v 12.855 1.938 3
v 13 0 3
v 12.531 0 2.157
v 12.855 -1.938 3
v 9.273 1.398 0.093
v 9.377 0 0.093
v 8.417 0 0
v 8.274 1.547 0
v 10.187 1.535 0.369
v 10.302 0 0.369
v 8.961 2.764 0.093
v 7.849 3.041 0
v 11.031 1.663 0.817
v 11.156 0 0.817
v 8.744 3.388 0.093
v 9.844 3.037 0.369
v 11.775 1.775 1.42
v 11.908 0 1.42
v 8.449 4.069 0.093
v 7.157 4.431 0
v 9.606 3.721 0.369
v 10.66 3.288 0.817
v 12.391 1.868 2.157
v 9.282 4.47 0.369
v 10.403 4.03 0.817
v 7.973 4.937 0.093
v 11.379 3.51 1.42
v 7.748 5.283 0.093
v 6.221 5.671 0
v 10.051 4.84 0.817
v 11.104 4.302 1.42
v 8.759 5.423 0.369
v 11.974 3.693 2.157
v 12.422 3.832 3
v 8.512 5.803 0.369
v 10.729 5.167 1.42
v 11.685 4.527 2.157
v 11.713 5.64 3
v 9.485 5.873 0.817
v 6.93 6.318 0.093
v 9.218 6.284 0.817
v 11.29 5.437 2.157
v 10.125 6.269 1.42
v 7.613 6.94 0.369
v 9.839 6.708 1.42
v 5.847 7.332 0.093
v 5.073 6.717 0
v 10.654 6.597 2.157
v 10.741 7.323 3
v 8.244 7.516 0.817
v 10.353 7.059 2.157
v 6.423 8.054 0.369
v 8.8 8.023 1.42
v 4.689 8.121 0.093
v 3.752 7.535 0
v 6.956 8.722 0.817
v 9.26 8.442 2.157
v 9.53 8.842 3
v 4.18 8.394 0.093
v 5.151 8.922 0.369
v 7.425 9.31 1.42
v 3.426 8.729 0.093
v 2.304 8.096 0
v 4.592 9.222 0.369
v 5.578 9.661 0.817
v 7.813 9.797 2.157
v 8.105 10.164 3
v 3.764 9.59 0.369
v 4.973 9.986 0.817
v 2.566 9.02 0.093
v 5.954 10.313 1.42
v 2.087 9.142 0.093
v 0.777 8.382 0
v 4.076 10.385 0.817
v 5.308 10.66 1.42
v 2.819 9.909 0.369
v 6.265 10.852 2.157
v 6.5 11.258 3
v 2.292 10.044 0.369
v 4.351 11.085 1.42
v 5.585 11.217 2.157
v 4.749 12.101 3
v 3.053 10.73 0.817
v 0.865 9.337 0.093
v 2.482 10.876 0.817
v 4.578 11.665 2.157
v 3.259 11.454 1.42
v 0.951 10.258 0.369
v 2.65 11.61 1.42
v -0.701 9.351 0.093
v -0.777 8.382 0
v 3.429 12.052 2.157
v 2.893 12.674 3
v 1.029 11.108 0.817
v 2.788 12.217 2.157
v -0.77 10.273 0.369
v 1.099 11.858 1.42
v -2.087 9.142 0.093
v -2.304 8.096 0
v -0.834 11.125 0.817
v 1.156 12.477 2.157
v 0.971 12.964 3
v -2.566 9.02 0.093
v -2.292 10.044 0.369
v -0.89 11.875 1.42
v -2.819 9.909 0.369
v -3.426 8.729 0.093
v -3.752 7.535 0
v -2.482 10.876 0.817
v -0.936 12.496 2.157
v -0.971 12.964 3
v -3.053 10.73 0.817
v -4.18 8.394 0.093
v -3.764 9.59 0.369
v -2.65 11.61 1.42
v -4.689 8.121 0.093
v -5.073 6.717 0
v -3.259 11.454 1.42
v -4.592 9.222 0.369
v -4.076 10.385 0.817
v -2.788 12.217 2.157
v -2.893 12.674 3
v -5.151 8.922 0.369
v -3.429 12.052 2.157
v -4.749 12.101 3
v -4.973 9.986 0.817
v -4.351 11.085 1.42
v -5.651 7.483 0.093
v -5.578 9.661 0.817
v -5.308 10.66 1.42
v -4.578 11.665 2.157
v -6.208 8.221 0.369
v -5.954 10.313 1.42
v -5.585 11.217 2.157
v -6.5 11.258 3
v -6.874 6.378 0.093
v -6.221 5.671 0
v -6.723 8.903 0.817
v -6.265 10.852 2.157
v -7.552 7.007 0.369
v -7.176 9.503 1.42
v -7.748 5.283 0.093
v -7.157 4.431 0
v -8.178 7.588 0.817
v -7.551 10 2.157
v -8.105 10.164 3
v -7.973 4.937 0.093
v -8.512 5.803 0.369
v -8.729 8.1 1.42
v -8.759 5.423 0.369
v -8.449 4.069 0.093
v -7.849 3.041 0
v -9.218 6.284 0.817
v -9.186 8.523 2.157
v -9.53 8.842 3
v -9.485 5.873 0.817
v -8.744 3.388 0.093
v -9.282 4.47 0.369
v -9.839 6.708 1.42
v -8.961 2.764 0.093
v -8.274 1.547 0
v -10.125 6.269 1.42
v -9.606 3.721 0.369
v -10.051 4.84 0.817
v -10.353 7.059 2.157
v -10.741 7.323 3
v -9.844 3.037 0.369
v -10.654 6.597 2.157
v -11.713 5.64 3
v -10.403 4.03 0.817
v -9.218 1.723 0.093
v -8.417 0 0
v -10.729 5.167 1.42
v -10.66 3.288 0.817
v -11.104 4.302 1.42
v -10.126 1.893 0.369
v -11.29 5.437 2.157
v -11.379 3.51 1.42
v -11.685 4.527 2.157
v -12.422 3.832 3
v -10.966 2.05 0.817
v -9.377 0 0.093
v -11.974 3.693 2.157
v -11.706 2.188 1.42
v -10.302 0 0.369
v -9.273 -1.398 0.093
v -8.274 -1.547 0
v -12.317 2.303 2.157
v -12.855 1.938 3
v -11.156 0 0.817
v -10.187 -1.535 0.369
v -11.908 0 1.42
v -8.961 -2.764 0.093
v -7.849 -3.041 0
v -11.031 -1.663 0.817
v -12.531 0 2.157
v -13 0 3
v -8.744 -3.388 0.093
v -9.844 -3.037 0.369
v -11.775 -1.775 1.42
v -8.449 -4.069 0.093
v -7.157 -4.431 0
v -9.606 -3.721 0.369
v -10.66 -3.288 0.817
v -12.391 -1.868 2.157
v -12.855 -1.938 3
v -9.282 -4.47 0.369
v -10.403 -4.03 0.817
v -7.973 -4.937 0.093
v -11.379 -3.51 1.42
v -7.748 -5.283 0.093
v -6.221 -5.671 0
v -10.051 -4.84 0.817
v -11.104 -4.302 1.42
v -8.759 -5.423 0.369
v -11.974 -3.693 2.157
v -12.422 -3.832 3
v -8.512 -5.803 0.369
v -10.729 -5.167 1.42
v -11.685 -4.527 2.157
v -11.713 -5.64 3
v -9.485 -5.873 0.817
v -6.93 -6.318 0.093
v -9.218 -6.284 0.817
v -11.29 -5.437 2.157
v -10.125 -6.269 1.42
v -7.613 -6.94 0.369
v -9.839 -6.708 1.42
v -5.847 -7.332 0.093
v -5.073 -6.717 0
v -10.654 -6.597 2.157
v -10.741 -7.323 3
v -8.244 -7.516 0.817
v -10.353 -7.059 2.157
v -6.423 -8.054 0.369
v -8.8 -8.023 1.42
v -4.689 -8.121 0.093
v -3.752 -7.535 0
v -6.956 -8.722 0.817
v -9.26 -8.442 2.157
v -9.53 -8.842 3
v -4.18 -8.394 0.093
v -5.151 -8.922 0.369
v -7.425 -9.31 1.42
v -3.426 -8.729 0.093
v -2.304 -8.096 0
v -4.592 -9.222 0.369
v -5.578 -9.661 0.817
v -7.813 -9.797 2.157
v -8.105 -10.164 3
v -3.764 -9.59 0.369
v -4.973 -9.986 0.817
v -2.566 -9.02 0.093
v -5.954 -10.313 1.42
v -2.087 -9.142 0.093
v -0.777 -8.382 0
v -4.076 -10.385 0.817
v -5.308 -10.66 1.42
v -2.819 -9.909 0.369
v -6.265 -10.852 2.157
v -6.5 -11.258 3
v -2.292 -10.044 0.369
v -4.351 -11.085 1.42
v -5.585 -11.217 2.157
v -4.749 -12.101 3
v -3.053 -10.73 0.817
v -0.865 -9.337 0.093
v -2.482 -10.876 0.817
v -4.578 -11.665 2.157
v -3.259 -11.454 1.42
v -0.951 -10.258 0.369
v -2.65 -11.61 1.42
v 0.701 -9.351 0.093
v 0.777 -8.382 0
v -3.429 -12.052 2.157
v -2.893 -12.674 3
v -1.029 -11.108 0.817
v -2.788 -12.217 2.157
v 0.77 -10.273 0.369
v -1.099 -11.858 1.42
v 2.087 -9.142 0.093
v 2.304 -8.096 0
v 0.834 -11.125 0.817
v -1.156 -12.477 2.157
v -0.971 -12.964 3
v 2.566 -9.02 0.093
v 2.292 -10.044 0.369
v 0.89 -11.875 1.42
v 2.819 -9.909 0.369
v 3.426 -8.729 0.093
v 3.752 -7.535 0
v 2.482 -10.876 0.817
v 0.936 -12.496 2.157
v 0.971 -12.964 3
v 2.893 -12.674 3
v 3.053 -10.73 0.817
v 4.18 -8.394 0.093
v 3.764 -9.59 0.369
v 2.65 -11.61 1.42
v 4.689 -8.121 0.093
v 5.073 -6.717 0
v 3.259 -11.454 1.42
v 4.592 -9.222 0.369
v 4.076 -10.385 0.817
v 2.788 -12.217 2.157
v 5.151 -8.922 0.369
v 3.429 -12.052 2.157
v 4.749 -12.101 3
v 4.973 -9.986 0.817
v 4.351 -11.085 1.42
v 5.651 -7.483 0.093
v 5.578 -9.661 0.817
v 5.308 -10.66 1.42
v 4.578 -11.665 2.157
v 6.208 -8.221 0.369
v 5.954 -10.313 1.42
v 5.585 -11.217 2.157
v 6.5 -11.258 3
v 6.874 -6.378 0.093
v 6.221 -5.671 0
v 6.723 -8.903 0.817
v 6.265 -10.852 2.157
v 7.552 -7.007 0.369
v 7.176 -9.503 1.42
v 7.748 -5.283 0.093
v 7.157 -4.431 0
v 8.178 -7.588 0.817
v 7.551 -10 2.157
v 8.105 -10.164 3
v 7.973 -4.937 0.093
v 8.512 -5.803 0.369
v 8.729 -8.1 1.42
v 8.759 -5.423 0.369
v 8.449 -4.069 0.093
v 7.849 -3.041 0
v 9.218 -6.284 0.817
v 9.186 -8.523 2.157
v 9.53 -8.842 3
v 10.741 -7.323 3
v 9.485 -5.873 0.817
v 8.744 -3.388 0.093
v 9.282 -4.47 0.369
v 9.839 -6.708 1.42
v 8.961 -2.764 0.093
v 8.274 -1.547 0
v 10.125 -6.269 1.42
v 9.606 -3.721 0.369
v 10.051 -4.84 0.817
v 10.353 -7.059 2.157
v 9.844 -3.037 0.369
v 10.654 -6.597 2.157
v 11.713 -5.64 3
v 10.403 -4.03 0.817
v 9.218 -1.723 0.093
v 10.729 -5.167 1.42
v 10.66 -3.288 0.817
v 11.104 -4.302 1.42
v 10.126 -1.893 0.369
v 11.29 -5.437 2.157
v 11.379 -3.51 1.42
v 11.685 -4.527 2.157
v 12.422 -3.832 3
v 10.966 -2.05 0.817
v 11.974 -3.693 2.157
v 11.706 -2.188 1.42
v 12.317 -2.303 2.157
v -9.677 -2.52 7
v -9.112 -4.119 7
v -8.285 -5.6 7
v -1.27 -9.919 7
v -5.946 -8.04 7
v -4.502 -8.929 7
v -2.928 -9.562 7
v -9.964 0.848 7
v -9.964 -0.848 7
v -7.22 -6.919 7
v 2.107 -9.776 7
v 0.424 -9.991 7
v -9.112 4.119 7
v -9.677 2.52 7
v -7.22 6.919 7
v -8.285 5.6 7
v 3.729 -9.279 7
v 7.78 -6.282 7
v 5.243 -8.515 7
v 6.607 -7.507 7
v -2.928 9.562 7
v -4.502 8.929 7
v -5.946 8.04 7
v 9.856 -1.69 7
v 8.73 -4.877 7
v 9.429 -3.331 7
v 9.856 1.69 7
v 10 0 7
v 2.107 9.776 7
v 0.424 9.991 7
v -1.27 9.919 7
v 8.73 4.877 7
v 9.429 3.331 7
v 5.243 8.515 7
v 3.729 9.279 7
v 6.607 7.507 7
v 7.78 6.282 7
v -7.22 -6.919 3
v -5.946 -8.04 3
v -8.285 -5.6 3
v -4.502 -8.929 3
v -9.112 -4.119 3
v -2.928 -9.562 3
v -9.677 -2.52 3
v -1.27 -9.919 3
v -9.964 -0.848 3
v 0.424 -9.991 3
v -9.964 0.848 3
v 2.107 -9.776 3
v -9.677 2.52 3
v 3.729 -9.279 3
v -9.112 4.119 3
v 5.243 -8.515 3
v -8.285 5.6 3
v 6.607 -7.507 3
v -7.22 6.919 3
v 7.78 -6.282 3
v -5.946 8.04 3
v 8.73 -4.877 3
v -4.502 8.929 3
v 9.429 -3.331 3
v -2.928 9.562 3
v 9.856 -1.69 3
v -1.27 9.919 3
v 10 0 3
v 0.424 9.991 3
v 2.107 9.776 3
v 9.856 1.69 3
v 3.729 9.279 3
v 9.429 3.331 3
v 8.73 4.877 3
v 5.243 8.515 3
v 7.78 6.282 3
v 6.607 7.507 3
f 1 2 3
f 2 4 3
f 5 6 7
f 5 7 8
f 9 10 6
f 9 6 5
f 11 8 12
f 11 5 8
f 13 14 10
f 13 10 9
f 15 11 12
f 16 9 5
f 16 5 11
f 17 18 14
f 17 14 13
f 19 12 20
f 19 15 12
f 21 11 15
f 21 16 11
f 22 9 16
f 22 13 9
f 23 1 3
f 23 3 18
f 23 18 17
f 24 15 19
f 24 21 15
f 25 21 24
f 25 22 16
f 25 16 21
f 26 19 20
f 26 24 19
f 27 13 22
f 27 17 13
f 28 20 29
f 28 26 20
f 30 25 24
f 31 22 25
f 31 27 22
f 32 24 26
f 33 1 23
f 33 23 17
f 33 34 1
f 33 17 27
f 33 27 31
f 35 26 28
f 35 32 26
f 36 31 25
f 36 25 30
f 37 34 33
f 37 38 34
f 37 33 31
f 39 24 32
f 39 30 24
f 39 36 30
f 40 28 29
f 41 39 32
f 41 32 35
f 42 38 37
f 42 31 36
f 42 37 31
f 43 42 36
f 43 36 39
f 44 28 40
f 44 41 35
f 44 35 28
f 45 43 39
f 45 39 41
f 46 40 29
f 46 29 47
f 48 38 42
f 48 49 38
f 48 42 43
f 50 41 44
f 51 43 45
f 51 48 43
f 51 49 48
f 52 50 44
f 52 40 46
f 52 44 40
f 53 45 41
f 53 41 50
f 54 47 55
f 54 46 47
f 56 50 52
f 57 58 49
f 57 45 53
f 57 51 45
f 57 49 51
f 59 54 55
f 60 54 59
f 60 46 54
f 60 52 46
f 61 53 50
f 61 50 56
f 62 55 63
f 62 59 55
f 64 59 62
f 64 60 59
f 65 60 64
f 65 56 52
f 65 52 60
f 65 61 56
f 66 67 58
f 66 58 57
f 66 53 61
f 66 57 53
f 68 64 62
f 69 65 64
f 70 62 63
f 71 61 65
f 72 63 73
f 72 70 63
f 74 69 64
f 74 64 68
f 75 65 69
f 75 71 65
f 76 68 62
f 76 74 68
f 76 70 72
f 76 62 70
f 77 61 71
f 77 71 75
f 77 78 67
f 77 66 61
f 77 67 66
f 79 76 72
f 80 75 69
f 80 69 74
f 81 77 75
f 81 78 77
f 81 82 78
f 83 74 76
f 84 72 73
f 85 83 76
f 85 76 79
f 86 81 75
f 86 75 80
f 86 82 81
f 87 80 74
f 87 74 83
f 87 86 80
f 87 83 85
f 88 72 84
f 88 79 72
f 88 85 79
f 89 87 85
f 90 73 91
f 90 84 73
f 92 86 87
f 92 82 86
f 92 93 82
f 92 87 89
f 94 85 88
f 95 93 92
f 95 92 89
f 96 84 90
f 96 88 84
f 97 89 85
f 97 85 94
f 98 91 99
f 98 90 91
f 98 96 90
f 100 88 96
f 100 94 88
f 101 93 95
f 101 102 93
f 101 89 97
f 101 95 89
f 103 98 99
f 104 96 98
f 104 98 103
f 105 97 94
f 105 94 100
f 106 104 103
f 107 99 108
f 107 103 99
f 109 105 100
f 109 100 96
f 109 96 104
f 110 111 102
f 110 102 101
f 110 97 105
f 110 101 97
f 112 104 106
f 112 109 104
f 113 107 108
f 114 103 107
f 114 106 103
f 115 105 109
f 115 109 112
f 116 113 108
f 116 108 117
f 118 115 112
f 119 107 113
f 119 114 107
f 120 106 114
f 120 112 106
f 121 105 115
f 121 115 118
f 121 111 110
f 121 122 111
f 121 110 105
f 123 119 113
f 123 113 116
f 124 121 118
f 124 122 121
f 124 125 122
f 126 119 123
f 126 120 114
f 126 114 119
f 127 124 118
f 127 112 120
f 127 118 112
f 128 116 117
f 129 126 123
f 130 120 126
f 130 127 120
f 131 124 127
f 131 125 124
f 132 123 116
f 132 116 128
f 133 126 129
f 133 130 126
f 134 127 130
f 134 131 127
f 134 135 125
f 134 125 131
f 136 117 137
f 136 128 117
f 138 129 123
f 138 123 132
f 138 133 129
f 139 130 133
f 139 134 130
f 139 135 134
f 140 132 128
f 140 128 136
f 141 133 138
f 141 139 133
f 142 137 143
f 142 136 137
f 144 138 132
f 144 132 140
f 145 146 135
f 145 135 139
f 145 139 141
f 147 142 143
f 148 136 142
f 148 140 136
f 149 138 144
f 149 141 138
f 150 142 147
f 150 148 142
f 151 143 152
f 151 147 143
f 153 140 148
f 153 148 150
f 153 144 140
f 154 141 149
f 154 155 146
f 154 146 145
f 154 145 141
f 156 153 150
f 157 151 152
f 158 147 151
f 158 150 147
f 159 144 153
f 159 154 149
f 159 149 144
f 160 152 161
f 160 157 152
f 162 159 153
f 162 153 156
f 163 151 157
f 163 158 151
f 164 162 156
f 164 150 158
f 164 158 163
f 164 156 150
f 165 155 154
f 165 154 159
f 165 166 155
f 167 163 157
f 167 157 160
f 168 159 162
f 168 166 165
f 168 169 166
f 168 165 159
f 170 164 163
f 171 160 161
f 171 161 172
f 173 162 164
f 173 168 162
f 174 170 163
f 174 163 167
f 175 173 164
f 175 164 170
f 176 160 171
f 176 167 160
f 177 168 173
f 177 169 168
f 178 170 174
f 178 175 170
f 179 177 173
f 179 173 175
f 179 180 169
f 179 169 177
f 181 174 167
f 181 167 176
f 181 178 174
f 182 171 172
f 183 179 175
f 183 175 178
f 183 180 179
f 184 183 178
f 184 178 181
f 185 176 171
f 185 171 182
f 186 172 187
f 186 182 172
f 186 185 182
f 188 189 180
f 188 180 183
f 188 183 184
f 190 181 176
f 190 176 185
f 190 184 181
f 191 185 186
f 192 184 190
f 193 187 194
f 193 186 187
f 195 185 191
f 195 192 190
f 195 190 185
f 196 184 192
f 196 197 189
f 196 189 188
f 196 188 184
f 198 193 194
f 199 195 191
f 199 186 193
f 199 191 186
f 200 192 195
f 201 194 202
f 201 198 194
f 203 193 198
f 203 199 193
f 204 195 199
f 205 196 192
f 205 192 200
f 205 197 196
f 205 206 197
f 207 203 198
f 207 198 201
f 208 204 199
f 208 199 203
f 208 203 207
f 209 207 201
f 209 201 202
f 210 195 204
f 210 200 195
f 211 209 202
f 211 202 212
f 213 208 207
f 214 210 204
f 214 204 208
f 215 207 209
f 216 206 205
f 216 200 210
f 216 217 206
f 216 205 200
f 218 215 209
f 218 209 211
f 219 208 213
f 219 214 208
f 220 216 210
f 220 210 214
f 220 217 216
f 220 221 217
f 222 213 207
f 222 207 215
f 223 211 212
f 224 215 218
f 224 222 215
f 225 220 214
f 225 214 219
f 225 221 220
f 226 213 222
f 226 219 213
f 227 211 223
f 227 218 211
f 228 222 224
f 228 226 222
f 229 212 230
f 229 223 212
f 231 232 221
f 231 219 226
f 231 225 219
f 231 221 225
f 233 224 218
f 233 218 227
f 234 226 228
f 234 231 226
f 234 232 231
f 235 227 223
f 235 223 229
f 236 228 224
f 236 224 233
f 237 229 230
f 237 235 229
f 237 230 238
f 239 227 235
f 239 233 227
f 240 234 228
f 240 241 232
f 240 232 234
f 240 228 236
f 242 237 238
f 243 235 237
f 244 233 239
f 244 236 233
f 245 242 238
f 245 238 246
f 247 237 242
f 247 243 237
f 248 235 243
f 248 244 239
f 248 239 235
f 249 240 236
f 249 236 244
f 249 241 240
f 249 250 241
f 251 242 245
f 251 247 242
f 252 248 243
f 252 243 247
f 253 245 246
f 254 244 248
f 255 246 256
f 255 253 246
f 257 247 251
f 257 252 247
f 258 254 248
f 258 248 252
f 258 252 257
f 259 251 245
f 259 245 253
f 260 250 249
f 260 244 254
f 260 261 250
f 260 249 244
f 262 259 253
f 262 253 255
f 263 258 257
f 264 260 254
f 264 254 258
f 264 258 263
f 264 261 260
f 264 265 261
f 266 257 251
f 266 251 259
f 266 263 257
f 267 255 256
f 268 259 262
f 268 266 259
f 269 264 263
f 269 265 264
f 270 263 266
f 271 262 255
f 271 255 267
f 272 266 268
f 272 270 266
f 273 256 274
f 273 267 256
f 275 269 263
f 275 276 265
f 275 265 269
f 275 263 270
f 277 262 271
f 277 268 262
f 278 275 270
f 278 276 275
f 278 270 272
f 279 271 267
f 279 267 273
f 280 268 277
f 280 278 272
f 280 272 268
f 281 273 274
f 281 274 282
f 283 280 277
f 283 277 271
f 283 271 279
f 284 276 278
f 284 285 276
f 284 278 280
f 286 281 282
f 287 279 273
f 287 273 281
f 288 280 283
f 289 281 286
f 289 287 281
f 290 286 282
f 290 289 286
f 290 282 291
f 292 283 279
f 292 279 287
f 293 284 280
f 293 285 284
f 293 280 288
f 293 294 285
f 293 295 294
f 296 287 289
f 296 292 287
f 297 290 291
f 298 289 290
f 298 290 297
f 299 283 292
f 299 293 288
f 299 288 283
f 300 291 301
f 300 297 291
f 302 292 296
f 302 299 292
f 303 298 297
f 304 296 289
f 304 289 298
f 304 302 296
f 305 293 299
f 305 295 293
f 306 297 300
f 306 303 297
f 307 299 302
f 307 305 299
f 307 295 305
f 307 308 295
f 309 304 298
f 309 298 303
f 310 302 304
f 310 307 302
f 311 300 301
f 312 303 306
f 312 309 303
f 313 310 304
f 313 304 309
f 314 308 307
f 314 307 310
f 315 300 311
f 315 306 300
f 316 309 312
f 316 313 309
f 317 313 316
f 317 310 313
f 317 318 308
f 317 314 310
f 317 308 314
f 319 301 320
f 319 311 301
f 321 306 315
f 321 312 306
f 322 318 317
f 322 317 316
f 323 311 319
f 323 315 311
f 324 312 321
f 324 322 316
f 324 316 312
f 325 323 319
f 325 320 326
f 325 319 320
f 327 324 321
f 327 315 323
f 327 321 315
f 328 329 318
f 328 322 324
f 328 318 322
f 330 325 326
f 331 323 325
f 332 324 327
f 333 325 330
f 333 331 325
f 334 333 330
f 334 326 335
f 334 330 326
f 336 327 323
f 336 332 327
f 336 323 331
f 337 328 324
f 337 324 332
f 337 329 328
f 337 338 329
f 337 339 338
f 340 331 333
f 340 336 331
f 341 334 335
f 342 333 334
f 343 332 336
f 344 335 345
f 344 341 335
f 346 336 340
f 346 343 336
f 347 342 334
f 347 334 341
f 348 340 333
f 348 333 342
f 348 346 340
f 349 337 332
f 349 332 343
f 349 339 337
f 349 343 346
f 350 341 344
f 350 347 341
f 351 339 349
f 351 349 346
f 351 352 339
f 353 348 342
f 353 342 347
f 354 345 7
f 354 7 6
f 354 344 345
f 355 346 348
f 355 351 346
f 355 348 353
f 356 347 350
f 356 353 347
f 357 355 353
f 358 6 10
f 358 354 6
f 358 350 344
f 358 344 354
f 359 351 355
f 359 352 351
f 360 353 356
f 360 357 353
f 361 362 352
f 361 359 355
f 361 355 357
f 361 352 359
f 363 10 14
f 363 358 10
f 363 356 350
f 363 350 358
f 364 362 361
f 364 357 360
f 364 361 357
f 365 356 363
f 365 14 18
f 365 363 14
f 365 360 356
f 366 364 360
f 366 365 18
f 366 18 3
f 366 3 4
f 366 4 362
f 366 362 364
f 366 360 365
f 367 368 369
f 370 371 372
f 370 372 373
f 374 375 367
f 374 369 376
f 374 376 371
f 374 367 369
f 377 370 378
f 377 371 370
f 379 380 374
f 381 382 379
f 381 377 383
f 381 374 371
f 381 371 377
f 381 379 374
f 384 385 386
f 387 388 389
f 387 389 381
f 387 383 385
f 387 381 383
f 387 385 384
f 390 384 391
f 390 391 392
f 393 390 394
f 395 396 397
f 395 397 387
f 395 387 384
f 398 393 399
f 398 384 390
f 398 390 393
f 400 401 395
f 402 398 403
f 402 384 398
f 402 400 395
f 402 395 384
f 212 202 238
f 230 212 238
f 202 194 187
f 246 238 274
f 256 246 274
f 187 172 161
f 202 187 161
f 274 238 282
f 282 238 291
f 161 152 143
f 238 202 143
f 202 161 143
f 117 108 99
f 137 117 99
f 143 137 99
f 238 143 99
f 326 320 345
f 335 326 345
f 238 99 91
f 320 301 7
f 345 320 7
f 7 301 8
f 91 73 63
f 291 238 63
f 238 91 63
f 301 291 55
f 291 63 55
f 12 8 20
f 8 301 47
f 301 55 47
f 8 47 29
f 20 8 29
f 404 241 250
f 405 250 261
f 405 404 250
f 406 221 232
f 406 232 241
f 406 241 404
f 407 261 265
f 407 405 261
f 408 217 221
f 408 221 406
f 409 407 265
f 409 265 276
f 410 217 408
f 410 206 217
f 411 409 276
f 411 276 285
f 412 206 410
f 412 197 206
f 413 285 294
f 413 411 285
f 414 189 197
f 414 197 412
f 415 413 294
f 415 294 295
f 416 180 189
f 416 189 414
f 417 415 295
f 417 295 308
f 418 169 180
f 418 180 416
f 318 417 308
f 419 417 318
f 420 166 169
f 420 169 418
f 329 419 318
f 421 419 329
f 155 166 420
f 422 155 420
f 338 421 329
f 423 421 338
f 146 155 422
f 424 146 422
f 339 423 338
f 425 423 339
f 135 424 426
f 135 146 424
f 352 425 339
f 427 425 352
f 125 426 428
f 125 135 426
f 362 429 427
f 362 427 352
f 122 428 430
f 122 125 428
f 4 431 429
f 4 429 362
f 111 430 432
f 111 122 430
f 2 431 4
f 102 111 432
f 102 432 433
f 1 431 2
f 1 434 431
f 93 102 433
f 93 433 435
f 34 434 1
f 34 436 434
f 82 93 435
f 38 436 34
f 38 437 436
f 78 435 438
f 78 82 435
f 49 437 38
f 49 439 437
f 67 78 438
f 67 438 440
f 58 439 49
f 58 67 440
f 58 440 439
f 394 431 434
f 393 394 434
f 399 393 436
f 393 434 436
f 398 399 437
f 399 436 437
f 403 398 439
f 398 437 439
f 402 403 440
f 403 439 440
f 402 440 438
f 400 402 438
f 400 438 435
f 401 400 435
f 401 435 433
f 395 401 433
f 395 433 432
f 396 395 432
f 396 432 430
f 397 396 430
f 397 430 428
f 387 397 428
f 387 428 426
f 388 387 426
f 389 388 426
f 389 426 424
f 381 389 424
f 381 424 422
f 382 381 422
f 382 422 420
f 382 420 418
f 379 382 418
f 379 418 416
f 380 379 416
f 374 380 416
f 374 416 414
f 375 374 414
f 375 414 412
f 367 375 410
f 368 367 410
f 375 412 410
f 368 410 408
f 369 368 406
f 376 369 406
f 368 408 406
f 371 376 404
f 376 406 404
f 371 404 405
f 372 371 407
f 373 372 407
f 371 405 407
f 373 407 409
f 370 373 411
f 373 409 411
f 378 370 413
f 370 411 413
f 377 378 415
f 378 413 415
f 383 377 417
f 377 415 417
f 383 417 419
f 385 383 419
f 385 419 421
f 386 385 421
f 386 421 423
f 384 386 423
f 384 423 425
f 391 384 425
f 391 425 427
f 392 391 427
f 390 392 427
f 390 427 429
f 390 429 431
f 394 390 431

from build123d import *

# Parameters (mm, degrees)
F1_R     = 10
F2_DEPTH = 7
F0_R     = 13
F3_DEPTH = 3


# Not quite as in the source:
# - a fillet or chamfer that OpenCascade refuses, or shapes differently, is made with other operations: its cross-section is extruded or revolved along the edge and cut away or added


with BuildPart() as f2:
    # F1 (on Top) → F2 (new body)
    with BuildSketch(Plane.XY):
        Circle(F1_R)
    extrude(amount=F2_DEPTH)

    # F0 (on Top) → F3 (join)
    with BuildSketch(Plane.XY):
        Circle(F0_R)
    extrude(amount=F3_DEPTH)

    # F4: fillet of radius 5 on 1 edges, made by hand

    # F4_s1 → F4_t2 (revolve, cut)
    with BuildSketch(Plane.XZ):
        with BuildLine():
            ThreePointArc((8.417424305, 0), (11.1560370926, 0.8166998673), (13, 3))
            Line((13, 3), (13, 0))
            Line((13, 0), (8.417424305, 0))
        make_face()
    revolve(axis=Axis((0, 0, 0), (0, 0, 1)), mode=Mode.SUBTRACT)


solid = f2.part
